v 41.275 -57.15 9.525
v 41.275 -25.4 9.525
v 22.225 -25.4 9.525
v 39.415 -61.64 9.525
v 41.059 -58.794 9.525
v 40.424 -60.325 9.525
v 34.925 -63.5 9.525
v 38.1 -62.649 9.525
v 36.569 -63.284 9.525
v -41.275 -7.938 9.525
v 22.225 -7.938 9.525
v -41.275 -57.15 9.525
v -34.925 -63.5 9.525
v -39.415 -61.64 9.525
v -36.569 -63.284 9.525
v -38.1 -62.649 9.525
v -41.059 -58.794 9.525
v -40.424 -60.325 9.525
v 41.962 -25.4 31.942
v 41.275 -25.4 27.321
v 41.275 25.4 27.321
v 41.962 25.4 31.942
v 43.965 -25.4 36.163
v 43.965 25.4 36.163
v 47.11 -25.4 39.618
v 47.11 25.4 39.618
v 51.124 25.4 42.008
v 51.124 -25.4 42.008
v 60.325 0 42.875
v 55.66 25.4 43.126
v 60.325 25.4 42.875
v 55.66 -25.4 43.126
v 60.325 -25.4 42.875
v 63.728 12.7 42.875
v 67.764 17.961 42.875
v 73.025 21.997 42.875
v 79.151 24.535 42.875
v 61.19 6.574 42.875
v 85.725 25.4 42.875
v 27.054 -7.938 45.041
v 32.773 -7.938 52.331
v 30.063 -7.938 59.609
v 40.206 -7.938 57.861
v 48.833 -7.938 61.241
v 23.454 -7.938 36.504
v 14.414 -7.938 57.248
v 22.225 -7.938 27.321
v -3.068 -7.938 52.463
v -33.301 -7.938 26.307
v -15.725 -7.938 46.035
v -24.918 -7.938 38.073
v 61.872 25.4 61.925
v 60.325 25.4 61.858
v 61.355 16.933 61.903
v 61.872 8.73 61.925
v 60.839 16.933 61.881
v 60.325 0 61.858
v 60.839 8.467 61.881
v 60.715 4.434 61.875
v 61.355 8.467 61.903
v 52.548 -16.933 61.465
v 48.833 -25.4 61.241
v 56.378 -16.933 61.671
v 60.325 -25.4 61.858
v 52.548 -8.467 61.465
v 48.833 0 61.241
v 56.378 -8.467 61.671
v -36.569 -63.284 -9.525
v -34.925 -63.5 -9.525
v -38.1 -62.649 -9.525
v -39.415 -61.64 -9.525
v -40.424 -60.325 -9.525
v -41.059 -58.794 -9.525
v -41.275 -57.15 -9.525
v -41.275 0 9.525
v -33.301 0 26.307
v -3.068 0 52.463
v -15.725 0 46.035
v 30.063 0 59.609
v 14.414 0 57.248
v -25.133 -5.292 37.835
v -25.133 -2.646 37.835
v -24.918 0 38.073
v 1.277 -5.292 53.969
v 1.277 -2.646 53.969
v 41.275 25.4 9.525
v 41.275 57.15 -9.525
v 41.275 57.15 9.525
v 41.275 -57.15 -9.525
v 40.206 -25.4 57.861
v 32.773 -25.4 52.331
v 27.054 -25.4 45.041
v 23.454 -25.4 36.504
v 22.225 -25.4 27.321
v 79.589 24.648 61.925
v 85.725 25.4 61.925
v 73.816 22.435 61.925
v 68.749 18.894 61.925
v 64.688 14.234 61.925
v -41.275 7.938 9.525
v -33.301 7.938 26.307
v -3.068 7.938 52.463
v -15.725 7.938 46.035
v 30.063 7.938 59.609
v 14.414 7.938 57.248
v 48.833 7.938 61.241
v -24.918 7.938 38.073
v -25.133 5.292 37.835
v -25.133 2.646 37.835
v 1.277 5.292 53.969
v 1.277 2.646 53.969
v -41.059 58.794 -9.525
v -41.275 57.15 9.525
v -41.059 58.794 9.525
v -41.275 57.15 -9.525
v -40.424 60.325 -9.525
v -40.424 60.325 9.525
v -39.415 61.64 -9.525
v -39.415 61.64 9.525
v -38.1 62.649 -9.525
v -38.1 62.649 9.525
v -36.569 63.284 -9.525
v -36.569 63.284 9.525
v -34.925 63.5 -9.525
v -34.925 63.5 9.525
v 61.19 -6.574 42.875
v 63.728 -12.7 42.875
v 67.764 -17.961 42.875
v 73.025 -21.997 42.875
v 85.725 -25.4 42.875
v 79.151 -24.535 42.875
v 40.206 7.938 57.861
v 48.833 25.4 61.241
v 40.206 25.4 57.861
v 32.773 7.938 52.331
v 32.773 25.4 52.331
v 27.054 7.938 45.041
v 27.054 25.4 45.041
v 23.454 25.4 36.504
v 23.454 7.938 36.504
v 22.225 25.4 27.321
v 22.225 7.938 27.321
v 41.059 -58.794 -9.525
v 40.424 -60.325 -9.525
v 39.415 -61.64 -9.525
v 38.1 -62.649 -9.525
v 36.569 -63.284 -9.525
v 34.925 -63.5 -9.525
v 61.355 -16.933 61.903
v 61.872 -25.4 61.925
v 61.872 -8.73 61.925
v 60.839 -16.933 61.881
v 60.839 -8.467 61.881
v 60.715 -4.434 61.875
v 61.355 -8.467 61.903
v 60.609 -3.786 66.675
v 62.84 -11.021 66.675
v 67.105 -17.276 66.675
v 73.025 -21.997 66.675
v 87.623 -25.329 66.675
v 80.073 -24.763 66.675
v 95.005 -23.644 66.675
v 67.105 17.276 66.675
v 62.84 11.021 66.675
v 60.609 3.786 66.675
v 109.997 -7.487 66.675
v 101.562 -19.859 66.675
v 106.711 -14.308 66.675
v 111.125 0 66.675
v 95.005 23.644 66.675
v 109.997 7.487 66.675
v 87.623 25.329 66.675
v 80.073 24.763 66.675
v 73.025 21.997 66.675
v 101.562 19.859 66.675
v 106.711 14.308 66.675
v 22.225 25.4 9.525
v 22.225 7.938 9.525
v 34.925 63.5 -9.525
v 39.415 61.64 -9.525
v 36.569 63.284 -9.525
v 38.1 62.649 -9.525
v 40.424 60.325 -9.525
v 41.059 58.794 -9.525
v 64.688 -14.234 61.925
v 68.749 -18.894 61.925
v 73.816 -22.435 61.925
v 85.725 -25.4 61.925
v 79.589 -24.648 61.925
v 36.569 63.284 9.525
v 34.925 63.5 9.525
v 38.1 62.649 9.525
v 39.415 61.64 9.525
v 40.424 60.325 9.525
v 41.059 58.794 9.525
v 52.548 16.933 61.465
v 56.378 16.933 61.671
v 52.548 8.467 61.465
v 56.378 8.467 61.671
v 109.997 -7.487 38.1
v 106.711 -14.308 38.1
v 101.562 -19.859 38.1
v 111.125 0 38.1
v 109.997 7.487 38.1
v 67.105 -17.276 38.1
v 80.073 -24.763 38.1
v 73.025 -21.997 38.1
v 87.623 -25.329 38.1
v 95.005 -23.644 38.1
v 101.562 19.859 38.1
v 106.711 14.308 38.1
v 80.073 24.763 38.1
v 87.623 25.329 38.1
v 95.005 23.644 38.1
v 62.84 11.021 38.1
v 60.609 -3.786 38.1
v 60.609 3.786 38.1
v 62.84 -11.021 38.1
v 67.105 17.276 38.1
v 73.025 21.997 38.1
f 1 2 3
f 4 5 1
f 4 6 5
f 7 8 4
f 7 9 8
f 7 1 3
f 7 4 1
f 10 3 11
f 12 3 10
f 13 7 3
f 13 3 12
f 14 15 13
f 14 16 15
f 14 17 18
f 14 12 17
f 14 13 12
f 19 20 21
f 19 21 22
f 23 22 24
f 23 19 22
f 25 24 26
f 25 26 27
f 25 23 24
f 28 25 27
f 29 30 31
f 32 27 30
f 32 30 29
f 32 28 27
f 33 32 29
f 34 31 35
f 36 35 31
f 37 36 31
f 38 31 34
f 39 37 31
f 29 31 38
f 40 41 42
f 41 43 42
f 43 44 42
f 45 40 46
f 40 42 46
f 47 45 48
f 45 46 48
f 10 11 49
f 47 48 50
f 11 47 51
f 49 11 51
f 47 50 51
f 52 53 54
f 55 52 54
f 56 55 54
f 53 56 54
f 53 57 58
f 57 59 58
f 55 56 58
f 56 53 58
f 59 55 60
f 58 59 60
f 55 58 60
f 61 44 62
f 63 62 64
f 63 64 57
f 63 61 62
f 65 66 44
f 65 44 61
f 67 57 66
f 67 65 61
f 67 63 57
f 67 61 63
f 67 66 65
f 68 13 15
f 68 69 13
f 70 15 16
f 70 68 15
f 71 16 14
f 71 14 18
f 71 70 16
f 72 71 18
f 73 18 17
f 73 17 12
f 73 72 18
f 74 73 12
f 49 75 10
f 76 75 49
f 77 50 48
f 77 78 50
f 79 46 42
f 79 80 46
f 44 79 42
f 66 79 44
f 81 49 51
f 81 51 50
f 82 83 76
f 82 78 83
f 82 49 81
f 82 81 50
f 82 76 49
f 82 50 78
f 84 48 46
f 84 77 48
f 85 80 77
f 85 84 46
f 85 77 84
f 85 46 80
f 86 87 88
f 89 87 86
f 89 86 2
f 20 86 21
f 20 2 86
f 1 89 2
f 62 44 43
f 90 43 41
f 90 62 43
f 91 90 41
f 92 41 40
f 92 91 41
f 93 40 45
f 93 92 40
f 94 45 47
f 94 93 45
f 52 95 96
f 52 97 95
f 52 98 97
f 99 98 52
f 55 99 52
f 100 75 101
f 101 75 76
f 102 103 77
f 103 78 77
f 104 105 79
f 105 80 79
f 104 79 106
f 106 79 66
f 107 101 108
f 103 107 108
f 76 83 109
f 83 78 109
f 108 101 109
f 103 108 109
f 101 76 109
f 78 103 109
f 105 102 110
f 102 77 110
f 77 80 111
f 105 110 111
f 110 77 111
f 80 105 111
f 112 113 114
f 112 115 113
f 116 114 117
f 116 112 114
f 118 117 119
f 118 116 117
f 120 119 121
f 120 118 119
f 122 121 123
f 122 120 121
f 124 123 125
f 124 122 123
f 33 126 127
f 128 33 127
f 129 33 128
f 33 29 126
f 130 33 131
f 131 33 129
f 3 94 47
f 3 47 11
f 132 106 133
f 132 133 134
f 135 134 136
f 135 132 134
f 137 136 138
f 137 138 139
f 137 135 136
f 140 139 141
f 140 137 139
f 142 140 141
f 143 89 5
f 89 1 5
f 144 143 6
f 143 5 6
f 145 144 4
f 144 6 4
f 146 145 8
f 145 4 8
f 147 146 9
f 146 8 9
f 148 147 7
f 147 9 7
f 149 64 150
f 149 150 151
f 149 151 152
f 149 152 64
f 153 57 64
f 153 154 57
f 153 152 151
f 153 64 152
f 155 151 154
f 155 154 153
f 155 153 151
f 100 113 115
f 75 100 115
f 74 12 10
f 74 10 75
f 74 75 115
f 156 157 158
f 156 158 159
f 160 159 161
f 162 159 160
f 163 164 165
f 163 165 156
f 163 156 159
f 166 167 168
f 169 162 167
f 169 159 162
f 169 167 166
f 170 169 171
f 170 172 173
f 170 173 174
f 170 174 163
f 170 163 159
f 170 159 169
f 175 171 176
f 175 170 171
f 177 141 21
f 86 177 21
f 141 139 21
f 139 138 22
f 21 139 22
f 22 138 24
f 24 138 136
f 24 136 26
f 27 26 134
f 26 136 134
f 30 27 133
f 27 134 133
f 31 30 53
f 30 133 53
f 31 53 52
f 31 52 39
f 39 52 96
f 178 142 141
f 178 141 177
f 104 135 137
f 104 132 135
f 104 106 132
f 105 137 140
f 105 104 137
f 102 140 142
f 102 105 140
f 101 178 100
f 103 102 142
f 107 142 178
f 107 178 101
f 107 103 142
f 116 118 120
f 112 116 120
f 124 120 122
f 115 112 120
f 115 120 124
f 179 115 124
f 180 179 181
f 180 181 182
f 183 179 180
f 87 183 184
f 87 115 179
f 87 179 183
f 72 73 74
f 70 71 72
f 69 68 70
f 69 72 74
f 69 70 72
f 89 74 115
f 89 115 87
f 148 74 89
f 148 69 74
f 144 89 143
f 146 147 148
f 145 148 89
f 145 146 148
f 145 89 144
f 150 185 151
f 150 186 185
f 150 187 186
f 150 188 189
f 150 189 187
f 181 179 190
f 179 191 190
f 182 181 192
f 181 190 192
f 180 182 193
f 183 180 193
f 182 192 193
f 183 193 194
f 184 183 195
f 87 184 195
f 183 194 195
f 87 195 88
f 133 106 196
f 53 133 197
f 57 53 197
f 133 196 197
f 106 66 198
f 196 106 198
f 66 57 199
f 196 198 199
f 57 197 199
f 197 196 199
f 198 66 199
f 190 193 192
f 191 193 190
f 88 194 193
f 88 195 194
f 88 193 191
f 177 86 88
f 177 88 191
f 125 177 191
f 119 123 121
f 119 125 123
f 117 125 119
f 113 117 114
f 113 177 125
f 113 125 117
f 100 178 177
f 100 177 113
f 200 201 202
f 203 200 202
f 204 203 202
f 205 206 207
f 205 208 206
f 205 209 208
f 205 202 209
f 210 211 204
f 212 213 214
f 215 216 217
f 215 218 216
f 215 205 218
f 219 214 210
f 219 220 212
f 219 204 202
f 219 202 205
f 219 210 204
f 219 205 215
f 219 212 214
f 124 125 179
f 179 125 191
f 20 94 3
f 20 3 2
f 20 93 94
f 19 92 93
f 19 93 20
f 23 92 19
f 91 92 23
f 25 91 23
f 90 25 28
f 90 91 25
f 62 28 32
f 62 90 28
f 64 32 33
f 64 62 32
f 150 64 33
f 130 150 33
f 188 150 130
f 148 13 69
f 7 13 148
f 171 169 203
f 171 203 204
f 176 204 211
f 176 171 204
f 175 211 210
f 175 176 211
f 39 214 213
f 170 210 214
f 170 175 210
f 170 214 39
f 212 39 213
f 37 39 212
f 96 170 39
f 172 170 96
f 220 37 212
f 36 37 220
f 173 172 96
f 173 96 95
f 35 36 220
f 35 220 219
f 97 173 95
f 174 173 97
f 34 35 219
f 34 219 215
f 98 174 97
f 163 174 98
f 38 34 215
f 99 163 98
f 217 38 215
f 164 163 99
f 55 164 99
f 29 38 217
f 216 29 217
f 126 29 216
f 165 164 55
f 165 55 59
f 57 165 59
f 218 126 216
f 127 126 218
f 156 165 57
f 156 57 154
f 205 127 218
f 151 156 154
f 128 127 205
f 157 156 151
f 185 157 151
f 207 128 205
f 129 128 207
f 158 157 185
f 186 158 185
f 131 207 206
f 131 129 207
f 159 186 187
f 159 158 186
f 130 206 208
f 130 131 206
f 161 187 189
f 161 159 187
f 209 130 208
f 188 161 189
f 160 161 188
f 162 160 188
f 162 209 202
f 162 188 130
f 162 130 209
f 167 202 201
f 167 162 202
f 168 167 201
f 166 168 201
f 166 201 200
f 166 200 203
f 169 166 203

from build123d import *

# Parameters (mm, degrees)
F1_DEPTH = 63.5
F2_DEPTH = 25.4
F3_DEPTH = 7.9375
F5_R     = 6.35
F6_R     = 6.35
F7_R     = 6.35
F8_R     = 6.35


with BuildPart() as f1:
    # F0 (on Front) → F1 (new body, symmetric)
    with BuildSketch(Plane.XZ):
        Polygon((22.225, 9.525), (-41.275, 9.525), (-41.275, -9.525), (41.275, -9.525), (41.275, 9.525), align=None)
    extrude(amount=F1_DEPTH, both=True)

    # F0 (on Front) → F2 (join, symmetric)
    with BuildSketch(Plane.XZ):
        with BuildLine():
            Line((22.225, 27.32094), (22.225, 9.525))
            Line((22.225, 9.525), (41.275, 9.525))
            Line((41.275, 9.525), (41.275, 27.32094))
            ThreePointArc((41.275, 27.32094), (47.109768, 39.617662), (60.325, 42.8752))
            Line((60.325, 42.8752), (60.325, 61.857935))
            add(Edge.make_bspline(
                [(48.832623, 61.241094), (52.4914, 61.474881), (56.318798, 61.67946), (60.325, 61.857935)],
                knots=[108.446727, 108.446727, 108.446727, 108.446727, 114.871759, 114.871759, 114.871759, 114.871759], degree=3))
            ThreePointArc((48.832623, 61.241094), (29.670553, 48.876348), (22.225, 27.32094))
        make_face()
        with BuildLine():
            add(Edge.make_bspline(
                [(60.325, 61.857935), (60.837854, 61.880782), (61.353639, 61.903202), (61.872375, 61.9252)],
                knots=[114.871759, 114.871759, 114.871759, 114.871759, 115.69426, 115.69426, 115.69426, 115.69426], degree=3))
            Line((60.325, 61.857935), (60.325, 42.8752))
            Line((60.325, 42.8752), (85.725, 42.8752))
            Line((85.725, 42.8752), (85.725, 61.9252))
            Line((85.725, 61.9252), (61.872375, 61.9252))
        make_face()
    extrude(amount=F2_DEPTH, both=True)

    # F0 (on Front) → F3 (join, symmetric)
    with BuildSketch(Plane.XZ):
        with BuildLine():
            add(Edge.make_bspline(
                [(-41.275, 9.525), (-26.639564, 45.028193), (-12.923076, 57.295065), (48.832623, 61.241094)],
                knots=[0, 0, 0, 0, 108.446727, 108.446727, 108.446727, 108.446727], degree=3))
            Line((-41.275, 9.525), (22.225, 9.525))
            Line((22.225, 9.525), (22.225, 27.32094))
            ThreePointArc((22.225, 27.32094), (29.670553, 48.876348), (48.832623, 61.241094))
        make_face()
    extrude(amount=F3_DEPTH, both=True)

    # F0 (on Front) → F4 (revolve)
    with BuildSketch(Plane.XZ):
        Polygon((111.125, 66.675), (85.725, 66.675), (85.725, 61.9252), (85.725, 42.8752), (85.725, 38.1), (111.125, 38.1), align=None)
    revolve(axis=Axis((85.725, 0, 52.3875), (0, 0, 1)))

    # F5
    f5_edges = [f1.edges().sort_by_distance(p)[0] for p in [
        (41.275, -63.5, 0),
    ]]
    fillet(f5_edges, radius=F5_R)

    # F6
    f6_edges = [f1.edges().sort_by_distance(p)[0] for p in [
        (-41.275, -63.5, 0),
    ]]
    fillet(f6_edges, radius=F6_R)

    # F7
    f7_edges = [f1.edges().sort_by_distance(p)[0] for p in [
        (-41.275, 63.5, 0),
    ]]
    fillet(f7_edges, radius=F7_R)

    # F8
    f8_edges = [f1.edges().sort_by_distance(p)[0] for p in [
        (41.275, 63.5, 0),
    ]]
    fillet(f8_edges, radius=F8_R)


solid = f1.part
